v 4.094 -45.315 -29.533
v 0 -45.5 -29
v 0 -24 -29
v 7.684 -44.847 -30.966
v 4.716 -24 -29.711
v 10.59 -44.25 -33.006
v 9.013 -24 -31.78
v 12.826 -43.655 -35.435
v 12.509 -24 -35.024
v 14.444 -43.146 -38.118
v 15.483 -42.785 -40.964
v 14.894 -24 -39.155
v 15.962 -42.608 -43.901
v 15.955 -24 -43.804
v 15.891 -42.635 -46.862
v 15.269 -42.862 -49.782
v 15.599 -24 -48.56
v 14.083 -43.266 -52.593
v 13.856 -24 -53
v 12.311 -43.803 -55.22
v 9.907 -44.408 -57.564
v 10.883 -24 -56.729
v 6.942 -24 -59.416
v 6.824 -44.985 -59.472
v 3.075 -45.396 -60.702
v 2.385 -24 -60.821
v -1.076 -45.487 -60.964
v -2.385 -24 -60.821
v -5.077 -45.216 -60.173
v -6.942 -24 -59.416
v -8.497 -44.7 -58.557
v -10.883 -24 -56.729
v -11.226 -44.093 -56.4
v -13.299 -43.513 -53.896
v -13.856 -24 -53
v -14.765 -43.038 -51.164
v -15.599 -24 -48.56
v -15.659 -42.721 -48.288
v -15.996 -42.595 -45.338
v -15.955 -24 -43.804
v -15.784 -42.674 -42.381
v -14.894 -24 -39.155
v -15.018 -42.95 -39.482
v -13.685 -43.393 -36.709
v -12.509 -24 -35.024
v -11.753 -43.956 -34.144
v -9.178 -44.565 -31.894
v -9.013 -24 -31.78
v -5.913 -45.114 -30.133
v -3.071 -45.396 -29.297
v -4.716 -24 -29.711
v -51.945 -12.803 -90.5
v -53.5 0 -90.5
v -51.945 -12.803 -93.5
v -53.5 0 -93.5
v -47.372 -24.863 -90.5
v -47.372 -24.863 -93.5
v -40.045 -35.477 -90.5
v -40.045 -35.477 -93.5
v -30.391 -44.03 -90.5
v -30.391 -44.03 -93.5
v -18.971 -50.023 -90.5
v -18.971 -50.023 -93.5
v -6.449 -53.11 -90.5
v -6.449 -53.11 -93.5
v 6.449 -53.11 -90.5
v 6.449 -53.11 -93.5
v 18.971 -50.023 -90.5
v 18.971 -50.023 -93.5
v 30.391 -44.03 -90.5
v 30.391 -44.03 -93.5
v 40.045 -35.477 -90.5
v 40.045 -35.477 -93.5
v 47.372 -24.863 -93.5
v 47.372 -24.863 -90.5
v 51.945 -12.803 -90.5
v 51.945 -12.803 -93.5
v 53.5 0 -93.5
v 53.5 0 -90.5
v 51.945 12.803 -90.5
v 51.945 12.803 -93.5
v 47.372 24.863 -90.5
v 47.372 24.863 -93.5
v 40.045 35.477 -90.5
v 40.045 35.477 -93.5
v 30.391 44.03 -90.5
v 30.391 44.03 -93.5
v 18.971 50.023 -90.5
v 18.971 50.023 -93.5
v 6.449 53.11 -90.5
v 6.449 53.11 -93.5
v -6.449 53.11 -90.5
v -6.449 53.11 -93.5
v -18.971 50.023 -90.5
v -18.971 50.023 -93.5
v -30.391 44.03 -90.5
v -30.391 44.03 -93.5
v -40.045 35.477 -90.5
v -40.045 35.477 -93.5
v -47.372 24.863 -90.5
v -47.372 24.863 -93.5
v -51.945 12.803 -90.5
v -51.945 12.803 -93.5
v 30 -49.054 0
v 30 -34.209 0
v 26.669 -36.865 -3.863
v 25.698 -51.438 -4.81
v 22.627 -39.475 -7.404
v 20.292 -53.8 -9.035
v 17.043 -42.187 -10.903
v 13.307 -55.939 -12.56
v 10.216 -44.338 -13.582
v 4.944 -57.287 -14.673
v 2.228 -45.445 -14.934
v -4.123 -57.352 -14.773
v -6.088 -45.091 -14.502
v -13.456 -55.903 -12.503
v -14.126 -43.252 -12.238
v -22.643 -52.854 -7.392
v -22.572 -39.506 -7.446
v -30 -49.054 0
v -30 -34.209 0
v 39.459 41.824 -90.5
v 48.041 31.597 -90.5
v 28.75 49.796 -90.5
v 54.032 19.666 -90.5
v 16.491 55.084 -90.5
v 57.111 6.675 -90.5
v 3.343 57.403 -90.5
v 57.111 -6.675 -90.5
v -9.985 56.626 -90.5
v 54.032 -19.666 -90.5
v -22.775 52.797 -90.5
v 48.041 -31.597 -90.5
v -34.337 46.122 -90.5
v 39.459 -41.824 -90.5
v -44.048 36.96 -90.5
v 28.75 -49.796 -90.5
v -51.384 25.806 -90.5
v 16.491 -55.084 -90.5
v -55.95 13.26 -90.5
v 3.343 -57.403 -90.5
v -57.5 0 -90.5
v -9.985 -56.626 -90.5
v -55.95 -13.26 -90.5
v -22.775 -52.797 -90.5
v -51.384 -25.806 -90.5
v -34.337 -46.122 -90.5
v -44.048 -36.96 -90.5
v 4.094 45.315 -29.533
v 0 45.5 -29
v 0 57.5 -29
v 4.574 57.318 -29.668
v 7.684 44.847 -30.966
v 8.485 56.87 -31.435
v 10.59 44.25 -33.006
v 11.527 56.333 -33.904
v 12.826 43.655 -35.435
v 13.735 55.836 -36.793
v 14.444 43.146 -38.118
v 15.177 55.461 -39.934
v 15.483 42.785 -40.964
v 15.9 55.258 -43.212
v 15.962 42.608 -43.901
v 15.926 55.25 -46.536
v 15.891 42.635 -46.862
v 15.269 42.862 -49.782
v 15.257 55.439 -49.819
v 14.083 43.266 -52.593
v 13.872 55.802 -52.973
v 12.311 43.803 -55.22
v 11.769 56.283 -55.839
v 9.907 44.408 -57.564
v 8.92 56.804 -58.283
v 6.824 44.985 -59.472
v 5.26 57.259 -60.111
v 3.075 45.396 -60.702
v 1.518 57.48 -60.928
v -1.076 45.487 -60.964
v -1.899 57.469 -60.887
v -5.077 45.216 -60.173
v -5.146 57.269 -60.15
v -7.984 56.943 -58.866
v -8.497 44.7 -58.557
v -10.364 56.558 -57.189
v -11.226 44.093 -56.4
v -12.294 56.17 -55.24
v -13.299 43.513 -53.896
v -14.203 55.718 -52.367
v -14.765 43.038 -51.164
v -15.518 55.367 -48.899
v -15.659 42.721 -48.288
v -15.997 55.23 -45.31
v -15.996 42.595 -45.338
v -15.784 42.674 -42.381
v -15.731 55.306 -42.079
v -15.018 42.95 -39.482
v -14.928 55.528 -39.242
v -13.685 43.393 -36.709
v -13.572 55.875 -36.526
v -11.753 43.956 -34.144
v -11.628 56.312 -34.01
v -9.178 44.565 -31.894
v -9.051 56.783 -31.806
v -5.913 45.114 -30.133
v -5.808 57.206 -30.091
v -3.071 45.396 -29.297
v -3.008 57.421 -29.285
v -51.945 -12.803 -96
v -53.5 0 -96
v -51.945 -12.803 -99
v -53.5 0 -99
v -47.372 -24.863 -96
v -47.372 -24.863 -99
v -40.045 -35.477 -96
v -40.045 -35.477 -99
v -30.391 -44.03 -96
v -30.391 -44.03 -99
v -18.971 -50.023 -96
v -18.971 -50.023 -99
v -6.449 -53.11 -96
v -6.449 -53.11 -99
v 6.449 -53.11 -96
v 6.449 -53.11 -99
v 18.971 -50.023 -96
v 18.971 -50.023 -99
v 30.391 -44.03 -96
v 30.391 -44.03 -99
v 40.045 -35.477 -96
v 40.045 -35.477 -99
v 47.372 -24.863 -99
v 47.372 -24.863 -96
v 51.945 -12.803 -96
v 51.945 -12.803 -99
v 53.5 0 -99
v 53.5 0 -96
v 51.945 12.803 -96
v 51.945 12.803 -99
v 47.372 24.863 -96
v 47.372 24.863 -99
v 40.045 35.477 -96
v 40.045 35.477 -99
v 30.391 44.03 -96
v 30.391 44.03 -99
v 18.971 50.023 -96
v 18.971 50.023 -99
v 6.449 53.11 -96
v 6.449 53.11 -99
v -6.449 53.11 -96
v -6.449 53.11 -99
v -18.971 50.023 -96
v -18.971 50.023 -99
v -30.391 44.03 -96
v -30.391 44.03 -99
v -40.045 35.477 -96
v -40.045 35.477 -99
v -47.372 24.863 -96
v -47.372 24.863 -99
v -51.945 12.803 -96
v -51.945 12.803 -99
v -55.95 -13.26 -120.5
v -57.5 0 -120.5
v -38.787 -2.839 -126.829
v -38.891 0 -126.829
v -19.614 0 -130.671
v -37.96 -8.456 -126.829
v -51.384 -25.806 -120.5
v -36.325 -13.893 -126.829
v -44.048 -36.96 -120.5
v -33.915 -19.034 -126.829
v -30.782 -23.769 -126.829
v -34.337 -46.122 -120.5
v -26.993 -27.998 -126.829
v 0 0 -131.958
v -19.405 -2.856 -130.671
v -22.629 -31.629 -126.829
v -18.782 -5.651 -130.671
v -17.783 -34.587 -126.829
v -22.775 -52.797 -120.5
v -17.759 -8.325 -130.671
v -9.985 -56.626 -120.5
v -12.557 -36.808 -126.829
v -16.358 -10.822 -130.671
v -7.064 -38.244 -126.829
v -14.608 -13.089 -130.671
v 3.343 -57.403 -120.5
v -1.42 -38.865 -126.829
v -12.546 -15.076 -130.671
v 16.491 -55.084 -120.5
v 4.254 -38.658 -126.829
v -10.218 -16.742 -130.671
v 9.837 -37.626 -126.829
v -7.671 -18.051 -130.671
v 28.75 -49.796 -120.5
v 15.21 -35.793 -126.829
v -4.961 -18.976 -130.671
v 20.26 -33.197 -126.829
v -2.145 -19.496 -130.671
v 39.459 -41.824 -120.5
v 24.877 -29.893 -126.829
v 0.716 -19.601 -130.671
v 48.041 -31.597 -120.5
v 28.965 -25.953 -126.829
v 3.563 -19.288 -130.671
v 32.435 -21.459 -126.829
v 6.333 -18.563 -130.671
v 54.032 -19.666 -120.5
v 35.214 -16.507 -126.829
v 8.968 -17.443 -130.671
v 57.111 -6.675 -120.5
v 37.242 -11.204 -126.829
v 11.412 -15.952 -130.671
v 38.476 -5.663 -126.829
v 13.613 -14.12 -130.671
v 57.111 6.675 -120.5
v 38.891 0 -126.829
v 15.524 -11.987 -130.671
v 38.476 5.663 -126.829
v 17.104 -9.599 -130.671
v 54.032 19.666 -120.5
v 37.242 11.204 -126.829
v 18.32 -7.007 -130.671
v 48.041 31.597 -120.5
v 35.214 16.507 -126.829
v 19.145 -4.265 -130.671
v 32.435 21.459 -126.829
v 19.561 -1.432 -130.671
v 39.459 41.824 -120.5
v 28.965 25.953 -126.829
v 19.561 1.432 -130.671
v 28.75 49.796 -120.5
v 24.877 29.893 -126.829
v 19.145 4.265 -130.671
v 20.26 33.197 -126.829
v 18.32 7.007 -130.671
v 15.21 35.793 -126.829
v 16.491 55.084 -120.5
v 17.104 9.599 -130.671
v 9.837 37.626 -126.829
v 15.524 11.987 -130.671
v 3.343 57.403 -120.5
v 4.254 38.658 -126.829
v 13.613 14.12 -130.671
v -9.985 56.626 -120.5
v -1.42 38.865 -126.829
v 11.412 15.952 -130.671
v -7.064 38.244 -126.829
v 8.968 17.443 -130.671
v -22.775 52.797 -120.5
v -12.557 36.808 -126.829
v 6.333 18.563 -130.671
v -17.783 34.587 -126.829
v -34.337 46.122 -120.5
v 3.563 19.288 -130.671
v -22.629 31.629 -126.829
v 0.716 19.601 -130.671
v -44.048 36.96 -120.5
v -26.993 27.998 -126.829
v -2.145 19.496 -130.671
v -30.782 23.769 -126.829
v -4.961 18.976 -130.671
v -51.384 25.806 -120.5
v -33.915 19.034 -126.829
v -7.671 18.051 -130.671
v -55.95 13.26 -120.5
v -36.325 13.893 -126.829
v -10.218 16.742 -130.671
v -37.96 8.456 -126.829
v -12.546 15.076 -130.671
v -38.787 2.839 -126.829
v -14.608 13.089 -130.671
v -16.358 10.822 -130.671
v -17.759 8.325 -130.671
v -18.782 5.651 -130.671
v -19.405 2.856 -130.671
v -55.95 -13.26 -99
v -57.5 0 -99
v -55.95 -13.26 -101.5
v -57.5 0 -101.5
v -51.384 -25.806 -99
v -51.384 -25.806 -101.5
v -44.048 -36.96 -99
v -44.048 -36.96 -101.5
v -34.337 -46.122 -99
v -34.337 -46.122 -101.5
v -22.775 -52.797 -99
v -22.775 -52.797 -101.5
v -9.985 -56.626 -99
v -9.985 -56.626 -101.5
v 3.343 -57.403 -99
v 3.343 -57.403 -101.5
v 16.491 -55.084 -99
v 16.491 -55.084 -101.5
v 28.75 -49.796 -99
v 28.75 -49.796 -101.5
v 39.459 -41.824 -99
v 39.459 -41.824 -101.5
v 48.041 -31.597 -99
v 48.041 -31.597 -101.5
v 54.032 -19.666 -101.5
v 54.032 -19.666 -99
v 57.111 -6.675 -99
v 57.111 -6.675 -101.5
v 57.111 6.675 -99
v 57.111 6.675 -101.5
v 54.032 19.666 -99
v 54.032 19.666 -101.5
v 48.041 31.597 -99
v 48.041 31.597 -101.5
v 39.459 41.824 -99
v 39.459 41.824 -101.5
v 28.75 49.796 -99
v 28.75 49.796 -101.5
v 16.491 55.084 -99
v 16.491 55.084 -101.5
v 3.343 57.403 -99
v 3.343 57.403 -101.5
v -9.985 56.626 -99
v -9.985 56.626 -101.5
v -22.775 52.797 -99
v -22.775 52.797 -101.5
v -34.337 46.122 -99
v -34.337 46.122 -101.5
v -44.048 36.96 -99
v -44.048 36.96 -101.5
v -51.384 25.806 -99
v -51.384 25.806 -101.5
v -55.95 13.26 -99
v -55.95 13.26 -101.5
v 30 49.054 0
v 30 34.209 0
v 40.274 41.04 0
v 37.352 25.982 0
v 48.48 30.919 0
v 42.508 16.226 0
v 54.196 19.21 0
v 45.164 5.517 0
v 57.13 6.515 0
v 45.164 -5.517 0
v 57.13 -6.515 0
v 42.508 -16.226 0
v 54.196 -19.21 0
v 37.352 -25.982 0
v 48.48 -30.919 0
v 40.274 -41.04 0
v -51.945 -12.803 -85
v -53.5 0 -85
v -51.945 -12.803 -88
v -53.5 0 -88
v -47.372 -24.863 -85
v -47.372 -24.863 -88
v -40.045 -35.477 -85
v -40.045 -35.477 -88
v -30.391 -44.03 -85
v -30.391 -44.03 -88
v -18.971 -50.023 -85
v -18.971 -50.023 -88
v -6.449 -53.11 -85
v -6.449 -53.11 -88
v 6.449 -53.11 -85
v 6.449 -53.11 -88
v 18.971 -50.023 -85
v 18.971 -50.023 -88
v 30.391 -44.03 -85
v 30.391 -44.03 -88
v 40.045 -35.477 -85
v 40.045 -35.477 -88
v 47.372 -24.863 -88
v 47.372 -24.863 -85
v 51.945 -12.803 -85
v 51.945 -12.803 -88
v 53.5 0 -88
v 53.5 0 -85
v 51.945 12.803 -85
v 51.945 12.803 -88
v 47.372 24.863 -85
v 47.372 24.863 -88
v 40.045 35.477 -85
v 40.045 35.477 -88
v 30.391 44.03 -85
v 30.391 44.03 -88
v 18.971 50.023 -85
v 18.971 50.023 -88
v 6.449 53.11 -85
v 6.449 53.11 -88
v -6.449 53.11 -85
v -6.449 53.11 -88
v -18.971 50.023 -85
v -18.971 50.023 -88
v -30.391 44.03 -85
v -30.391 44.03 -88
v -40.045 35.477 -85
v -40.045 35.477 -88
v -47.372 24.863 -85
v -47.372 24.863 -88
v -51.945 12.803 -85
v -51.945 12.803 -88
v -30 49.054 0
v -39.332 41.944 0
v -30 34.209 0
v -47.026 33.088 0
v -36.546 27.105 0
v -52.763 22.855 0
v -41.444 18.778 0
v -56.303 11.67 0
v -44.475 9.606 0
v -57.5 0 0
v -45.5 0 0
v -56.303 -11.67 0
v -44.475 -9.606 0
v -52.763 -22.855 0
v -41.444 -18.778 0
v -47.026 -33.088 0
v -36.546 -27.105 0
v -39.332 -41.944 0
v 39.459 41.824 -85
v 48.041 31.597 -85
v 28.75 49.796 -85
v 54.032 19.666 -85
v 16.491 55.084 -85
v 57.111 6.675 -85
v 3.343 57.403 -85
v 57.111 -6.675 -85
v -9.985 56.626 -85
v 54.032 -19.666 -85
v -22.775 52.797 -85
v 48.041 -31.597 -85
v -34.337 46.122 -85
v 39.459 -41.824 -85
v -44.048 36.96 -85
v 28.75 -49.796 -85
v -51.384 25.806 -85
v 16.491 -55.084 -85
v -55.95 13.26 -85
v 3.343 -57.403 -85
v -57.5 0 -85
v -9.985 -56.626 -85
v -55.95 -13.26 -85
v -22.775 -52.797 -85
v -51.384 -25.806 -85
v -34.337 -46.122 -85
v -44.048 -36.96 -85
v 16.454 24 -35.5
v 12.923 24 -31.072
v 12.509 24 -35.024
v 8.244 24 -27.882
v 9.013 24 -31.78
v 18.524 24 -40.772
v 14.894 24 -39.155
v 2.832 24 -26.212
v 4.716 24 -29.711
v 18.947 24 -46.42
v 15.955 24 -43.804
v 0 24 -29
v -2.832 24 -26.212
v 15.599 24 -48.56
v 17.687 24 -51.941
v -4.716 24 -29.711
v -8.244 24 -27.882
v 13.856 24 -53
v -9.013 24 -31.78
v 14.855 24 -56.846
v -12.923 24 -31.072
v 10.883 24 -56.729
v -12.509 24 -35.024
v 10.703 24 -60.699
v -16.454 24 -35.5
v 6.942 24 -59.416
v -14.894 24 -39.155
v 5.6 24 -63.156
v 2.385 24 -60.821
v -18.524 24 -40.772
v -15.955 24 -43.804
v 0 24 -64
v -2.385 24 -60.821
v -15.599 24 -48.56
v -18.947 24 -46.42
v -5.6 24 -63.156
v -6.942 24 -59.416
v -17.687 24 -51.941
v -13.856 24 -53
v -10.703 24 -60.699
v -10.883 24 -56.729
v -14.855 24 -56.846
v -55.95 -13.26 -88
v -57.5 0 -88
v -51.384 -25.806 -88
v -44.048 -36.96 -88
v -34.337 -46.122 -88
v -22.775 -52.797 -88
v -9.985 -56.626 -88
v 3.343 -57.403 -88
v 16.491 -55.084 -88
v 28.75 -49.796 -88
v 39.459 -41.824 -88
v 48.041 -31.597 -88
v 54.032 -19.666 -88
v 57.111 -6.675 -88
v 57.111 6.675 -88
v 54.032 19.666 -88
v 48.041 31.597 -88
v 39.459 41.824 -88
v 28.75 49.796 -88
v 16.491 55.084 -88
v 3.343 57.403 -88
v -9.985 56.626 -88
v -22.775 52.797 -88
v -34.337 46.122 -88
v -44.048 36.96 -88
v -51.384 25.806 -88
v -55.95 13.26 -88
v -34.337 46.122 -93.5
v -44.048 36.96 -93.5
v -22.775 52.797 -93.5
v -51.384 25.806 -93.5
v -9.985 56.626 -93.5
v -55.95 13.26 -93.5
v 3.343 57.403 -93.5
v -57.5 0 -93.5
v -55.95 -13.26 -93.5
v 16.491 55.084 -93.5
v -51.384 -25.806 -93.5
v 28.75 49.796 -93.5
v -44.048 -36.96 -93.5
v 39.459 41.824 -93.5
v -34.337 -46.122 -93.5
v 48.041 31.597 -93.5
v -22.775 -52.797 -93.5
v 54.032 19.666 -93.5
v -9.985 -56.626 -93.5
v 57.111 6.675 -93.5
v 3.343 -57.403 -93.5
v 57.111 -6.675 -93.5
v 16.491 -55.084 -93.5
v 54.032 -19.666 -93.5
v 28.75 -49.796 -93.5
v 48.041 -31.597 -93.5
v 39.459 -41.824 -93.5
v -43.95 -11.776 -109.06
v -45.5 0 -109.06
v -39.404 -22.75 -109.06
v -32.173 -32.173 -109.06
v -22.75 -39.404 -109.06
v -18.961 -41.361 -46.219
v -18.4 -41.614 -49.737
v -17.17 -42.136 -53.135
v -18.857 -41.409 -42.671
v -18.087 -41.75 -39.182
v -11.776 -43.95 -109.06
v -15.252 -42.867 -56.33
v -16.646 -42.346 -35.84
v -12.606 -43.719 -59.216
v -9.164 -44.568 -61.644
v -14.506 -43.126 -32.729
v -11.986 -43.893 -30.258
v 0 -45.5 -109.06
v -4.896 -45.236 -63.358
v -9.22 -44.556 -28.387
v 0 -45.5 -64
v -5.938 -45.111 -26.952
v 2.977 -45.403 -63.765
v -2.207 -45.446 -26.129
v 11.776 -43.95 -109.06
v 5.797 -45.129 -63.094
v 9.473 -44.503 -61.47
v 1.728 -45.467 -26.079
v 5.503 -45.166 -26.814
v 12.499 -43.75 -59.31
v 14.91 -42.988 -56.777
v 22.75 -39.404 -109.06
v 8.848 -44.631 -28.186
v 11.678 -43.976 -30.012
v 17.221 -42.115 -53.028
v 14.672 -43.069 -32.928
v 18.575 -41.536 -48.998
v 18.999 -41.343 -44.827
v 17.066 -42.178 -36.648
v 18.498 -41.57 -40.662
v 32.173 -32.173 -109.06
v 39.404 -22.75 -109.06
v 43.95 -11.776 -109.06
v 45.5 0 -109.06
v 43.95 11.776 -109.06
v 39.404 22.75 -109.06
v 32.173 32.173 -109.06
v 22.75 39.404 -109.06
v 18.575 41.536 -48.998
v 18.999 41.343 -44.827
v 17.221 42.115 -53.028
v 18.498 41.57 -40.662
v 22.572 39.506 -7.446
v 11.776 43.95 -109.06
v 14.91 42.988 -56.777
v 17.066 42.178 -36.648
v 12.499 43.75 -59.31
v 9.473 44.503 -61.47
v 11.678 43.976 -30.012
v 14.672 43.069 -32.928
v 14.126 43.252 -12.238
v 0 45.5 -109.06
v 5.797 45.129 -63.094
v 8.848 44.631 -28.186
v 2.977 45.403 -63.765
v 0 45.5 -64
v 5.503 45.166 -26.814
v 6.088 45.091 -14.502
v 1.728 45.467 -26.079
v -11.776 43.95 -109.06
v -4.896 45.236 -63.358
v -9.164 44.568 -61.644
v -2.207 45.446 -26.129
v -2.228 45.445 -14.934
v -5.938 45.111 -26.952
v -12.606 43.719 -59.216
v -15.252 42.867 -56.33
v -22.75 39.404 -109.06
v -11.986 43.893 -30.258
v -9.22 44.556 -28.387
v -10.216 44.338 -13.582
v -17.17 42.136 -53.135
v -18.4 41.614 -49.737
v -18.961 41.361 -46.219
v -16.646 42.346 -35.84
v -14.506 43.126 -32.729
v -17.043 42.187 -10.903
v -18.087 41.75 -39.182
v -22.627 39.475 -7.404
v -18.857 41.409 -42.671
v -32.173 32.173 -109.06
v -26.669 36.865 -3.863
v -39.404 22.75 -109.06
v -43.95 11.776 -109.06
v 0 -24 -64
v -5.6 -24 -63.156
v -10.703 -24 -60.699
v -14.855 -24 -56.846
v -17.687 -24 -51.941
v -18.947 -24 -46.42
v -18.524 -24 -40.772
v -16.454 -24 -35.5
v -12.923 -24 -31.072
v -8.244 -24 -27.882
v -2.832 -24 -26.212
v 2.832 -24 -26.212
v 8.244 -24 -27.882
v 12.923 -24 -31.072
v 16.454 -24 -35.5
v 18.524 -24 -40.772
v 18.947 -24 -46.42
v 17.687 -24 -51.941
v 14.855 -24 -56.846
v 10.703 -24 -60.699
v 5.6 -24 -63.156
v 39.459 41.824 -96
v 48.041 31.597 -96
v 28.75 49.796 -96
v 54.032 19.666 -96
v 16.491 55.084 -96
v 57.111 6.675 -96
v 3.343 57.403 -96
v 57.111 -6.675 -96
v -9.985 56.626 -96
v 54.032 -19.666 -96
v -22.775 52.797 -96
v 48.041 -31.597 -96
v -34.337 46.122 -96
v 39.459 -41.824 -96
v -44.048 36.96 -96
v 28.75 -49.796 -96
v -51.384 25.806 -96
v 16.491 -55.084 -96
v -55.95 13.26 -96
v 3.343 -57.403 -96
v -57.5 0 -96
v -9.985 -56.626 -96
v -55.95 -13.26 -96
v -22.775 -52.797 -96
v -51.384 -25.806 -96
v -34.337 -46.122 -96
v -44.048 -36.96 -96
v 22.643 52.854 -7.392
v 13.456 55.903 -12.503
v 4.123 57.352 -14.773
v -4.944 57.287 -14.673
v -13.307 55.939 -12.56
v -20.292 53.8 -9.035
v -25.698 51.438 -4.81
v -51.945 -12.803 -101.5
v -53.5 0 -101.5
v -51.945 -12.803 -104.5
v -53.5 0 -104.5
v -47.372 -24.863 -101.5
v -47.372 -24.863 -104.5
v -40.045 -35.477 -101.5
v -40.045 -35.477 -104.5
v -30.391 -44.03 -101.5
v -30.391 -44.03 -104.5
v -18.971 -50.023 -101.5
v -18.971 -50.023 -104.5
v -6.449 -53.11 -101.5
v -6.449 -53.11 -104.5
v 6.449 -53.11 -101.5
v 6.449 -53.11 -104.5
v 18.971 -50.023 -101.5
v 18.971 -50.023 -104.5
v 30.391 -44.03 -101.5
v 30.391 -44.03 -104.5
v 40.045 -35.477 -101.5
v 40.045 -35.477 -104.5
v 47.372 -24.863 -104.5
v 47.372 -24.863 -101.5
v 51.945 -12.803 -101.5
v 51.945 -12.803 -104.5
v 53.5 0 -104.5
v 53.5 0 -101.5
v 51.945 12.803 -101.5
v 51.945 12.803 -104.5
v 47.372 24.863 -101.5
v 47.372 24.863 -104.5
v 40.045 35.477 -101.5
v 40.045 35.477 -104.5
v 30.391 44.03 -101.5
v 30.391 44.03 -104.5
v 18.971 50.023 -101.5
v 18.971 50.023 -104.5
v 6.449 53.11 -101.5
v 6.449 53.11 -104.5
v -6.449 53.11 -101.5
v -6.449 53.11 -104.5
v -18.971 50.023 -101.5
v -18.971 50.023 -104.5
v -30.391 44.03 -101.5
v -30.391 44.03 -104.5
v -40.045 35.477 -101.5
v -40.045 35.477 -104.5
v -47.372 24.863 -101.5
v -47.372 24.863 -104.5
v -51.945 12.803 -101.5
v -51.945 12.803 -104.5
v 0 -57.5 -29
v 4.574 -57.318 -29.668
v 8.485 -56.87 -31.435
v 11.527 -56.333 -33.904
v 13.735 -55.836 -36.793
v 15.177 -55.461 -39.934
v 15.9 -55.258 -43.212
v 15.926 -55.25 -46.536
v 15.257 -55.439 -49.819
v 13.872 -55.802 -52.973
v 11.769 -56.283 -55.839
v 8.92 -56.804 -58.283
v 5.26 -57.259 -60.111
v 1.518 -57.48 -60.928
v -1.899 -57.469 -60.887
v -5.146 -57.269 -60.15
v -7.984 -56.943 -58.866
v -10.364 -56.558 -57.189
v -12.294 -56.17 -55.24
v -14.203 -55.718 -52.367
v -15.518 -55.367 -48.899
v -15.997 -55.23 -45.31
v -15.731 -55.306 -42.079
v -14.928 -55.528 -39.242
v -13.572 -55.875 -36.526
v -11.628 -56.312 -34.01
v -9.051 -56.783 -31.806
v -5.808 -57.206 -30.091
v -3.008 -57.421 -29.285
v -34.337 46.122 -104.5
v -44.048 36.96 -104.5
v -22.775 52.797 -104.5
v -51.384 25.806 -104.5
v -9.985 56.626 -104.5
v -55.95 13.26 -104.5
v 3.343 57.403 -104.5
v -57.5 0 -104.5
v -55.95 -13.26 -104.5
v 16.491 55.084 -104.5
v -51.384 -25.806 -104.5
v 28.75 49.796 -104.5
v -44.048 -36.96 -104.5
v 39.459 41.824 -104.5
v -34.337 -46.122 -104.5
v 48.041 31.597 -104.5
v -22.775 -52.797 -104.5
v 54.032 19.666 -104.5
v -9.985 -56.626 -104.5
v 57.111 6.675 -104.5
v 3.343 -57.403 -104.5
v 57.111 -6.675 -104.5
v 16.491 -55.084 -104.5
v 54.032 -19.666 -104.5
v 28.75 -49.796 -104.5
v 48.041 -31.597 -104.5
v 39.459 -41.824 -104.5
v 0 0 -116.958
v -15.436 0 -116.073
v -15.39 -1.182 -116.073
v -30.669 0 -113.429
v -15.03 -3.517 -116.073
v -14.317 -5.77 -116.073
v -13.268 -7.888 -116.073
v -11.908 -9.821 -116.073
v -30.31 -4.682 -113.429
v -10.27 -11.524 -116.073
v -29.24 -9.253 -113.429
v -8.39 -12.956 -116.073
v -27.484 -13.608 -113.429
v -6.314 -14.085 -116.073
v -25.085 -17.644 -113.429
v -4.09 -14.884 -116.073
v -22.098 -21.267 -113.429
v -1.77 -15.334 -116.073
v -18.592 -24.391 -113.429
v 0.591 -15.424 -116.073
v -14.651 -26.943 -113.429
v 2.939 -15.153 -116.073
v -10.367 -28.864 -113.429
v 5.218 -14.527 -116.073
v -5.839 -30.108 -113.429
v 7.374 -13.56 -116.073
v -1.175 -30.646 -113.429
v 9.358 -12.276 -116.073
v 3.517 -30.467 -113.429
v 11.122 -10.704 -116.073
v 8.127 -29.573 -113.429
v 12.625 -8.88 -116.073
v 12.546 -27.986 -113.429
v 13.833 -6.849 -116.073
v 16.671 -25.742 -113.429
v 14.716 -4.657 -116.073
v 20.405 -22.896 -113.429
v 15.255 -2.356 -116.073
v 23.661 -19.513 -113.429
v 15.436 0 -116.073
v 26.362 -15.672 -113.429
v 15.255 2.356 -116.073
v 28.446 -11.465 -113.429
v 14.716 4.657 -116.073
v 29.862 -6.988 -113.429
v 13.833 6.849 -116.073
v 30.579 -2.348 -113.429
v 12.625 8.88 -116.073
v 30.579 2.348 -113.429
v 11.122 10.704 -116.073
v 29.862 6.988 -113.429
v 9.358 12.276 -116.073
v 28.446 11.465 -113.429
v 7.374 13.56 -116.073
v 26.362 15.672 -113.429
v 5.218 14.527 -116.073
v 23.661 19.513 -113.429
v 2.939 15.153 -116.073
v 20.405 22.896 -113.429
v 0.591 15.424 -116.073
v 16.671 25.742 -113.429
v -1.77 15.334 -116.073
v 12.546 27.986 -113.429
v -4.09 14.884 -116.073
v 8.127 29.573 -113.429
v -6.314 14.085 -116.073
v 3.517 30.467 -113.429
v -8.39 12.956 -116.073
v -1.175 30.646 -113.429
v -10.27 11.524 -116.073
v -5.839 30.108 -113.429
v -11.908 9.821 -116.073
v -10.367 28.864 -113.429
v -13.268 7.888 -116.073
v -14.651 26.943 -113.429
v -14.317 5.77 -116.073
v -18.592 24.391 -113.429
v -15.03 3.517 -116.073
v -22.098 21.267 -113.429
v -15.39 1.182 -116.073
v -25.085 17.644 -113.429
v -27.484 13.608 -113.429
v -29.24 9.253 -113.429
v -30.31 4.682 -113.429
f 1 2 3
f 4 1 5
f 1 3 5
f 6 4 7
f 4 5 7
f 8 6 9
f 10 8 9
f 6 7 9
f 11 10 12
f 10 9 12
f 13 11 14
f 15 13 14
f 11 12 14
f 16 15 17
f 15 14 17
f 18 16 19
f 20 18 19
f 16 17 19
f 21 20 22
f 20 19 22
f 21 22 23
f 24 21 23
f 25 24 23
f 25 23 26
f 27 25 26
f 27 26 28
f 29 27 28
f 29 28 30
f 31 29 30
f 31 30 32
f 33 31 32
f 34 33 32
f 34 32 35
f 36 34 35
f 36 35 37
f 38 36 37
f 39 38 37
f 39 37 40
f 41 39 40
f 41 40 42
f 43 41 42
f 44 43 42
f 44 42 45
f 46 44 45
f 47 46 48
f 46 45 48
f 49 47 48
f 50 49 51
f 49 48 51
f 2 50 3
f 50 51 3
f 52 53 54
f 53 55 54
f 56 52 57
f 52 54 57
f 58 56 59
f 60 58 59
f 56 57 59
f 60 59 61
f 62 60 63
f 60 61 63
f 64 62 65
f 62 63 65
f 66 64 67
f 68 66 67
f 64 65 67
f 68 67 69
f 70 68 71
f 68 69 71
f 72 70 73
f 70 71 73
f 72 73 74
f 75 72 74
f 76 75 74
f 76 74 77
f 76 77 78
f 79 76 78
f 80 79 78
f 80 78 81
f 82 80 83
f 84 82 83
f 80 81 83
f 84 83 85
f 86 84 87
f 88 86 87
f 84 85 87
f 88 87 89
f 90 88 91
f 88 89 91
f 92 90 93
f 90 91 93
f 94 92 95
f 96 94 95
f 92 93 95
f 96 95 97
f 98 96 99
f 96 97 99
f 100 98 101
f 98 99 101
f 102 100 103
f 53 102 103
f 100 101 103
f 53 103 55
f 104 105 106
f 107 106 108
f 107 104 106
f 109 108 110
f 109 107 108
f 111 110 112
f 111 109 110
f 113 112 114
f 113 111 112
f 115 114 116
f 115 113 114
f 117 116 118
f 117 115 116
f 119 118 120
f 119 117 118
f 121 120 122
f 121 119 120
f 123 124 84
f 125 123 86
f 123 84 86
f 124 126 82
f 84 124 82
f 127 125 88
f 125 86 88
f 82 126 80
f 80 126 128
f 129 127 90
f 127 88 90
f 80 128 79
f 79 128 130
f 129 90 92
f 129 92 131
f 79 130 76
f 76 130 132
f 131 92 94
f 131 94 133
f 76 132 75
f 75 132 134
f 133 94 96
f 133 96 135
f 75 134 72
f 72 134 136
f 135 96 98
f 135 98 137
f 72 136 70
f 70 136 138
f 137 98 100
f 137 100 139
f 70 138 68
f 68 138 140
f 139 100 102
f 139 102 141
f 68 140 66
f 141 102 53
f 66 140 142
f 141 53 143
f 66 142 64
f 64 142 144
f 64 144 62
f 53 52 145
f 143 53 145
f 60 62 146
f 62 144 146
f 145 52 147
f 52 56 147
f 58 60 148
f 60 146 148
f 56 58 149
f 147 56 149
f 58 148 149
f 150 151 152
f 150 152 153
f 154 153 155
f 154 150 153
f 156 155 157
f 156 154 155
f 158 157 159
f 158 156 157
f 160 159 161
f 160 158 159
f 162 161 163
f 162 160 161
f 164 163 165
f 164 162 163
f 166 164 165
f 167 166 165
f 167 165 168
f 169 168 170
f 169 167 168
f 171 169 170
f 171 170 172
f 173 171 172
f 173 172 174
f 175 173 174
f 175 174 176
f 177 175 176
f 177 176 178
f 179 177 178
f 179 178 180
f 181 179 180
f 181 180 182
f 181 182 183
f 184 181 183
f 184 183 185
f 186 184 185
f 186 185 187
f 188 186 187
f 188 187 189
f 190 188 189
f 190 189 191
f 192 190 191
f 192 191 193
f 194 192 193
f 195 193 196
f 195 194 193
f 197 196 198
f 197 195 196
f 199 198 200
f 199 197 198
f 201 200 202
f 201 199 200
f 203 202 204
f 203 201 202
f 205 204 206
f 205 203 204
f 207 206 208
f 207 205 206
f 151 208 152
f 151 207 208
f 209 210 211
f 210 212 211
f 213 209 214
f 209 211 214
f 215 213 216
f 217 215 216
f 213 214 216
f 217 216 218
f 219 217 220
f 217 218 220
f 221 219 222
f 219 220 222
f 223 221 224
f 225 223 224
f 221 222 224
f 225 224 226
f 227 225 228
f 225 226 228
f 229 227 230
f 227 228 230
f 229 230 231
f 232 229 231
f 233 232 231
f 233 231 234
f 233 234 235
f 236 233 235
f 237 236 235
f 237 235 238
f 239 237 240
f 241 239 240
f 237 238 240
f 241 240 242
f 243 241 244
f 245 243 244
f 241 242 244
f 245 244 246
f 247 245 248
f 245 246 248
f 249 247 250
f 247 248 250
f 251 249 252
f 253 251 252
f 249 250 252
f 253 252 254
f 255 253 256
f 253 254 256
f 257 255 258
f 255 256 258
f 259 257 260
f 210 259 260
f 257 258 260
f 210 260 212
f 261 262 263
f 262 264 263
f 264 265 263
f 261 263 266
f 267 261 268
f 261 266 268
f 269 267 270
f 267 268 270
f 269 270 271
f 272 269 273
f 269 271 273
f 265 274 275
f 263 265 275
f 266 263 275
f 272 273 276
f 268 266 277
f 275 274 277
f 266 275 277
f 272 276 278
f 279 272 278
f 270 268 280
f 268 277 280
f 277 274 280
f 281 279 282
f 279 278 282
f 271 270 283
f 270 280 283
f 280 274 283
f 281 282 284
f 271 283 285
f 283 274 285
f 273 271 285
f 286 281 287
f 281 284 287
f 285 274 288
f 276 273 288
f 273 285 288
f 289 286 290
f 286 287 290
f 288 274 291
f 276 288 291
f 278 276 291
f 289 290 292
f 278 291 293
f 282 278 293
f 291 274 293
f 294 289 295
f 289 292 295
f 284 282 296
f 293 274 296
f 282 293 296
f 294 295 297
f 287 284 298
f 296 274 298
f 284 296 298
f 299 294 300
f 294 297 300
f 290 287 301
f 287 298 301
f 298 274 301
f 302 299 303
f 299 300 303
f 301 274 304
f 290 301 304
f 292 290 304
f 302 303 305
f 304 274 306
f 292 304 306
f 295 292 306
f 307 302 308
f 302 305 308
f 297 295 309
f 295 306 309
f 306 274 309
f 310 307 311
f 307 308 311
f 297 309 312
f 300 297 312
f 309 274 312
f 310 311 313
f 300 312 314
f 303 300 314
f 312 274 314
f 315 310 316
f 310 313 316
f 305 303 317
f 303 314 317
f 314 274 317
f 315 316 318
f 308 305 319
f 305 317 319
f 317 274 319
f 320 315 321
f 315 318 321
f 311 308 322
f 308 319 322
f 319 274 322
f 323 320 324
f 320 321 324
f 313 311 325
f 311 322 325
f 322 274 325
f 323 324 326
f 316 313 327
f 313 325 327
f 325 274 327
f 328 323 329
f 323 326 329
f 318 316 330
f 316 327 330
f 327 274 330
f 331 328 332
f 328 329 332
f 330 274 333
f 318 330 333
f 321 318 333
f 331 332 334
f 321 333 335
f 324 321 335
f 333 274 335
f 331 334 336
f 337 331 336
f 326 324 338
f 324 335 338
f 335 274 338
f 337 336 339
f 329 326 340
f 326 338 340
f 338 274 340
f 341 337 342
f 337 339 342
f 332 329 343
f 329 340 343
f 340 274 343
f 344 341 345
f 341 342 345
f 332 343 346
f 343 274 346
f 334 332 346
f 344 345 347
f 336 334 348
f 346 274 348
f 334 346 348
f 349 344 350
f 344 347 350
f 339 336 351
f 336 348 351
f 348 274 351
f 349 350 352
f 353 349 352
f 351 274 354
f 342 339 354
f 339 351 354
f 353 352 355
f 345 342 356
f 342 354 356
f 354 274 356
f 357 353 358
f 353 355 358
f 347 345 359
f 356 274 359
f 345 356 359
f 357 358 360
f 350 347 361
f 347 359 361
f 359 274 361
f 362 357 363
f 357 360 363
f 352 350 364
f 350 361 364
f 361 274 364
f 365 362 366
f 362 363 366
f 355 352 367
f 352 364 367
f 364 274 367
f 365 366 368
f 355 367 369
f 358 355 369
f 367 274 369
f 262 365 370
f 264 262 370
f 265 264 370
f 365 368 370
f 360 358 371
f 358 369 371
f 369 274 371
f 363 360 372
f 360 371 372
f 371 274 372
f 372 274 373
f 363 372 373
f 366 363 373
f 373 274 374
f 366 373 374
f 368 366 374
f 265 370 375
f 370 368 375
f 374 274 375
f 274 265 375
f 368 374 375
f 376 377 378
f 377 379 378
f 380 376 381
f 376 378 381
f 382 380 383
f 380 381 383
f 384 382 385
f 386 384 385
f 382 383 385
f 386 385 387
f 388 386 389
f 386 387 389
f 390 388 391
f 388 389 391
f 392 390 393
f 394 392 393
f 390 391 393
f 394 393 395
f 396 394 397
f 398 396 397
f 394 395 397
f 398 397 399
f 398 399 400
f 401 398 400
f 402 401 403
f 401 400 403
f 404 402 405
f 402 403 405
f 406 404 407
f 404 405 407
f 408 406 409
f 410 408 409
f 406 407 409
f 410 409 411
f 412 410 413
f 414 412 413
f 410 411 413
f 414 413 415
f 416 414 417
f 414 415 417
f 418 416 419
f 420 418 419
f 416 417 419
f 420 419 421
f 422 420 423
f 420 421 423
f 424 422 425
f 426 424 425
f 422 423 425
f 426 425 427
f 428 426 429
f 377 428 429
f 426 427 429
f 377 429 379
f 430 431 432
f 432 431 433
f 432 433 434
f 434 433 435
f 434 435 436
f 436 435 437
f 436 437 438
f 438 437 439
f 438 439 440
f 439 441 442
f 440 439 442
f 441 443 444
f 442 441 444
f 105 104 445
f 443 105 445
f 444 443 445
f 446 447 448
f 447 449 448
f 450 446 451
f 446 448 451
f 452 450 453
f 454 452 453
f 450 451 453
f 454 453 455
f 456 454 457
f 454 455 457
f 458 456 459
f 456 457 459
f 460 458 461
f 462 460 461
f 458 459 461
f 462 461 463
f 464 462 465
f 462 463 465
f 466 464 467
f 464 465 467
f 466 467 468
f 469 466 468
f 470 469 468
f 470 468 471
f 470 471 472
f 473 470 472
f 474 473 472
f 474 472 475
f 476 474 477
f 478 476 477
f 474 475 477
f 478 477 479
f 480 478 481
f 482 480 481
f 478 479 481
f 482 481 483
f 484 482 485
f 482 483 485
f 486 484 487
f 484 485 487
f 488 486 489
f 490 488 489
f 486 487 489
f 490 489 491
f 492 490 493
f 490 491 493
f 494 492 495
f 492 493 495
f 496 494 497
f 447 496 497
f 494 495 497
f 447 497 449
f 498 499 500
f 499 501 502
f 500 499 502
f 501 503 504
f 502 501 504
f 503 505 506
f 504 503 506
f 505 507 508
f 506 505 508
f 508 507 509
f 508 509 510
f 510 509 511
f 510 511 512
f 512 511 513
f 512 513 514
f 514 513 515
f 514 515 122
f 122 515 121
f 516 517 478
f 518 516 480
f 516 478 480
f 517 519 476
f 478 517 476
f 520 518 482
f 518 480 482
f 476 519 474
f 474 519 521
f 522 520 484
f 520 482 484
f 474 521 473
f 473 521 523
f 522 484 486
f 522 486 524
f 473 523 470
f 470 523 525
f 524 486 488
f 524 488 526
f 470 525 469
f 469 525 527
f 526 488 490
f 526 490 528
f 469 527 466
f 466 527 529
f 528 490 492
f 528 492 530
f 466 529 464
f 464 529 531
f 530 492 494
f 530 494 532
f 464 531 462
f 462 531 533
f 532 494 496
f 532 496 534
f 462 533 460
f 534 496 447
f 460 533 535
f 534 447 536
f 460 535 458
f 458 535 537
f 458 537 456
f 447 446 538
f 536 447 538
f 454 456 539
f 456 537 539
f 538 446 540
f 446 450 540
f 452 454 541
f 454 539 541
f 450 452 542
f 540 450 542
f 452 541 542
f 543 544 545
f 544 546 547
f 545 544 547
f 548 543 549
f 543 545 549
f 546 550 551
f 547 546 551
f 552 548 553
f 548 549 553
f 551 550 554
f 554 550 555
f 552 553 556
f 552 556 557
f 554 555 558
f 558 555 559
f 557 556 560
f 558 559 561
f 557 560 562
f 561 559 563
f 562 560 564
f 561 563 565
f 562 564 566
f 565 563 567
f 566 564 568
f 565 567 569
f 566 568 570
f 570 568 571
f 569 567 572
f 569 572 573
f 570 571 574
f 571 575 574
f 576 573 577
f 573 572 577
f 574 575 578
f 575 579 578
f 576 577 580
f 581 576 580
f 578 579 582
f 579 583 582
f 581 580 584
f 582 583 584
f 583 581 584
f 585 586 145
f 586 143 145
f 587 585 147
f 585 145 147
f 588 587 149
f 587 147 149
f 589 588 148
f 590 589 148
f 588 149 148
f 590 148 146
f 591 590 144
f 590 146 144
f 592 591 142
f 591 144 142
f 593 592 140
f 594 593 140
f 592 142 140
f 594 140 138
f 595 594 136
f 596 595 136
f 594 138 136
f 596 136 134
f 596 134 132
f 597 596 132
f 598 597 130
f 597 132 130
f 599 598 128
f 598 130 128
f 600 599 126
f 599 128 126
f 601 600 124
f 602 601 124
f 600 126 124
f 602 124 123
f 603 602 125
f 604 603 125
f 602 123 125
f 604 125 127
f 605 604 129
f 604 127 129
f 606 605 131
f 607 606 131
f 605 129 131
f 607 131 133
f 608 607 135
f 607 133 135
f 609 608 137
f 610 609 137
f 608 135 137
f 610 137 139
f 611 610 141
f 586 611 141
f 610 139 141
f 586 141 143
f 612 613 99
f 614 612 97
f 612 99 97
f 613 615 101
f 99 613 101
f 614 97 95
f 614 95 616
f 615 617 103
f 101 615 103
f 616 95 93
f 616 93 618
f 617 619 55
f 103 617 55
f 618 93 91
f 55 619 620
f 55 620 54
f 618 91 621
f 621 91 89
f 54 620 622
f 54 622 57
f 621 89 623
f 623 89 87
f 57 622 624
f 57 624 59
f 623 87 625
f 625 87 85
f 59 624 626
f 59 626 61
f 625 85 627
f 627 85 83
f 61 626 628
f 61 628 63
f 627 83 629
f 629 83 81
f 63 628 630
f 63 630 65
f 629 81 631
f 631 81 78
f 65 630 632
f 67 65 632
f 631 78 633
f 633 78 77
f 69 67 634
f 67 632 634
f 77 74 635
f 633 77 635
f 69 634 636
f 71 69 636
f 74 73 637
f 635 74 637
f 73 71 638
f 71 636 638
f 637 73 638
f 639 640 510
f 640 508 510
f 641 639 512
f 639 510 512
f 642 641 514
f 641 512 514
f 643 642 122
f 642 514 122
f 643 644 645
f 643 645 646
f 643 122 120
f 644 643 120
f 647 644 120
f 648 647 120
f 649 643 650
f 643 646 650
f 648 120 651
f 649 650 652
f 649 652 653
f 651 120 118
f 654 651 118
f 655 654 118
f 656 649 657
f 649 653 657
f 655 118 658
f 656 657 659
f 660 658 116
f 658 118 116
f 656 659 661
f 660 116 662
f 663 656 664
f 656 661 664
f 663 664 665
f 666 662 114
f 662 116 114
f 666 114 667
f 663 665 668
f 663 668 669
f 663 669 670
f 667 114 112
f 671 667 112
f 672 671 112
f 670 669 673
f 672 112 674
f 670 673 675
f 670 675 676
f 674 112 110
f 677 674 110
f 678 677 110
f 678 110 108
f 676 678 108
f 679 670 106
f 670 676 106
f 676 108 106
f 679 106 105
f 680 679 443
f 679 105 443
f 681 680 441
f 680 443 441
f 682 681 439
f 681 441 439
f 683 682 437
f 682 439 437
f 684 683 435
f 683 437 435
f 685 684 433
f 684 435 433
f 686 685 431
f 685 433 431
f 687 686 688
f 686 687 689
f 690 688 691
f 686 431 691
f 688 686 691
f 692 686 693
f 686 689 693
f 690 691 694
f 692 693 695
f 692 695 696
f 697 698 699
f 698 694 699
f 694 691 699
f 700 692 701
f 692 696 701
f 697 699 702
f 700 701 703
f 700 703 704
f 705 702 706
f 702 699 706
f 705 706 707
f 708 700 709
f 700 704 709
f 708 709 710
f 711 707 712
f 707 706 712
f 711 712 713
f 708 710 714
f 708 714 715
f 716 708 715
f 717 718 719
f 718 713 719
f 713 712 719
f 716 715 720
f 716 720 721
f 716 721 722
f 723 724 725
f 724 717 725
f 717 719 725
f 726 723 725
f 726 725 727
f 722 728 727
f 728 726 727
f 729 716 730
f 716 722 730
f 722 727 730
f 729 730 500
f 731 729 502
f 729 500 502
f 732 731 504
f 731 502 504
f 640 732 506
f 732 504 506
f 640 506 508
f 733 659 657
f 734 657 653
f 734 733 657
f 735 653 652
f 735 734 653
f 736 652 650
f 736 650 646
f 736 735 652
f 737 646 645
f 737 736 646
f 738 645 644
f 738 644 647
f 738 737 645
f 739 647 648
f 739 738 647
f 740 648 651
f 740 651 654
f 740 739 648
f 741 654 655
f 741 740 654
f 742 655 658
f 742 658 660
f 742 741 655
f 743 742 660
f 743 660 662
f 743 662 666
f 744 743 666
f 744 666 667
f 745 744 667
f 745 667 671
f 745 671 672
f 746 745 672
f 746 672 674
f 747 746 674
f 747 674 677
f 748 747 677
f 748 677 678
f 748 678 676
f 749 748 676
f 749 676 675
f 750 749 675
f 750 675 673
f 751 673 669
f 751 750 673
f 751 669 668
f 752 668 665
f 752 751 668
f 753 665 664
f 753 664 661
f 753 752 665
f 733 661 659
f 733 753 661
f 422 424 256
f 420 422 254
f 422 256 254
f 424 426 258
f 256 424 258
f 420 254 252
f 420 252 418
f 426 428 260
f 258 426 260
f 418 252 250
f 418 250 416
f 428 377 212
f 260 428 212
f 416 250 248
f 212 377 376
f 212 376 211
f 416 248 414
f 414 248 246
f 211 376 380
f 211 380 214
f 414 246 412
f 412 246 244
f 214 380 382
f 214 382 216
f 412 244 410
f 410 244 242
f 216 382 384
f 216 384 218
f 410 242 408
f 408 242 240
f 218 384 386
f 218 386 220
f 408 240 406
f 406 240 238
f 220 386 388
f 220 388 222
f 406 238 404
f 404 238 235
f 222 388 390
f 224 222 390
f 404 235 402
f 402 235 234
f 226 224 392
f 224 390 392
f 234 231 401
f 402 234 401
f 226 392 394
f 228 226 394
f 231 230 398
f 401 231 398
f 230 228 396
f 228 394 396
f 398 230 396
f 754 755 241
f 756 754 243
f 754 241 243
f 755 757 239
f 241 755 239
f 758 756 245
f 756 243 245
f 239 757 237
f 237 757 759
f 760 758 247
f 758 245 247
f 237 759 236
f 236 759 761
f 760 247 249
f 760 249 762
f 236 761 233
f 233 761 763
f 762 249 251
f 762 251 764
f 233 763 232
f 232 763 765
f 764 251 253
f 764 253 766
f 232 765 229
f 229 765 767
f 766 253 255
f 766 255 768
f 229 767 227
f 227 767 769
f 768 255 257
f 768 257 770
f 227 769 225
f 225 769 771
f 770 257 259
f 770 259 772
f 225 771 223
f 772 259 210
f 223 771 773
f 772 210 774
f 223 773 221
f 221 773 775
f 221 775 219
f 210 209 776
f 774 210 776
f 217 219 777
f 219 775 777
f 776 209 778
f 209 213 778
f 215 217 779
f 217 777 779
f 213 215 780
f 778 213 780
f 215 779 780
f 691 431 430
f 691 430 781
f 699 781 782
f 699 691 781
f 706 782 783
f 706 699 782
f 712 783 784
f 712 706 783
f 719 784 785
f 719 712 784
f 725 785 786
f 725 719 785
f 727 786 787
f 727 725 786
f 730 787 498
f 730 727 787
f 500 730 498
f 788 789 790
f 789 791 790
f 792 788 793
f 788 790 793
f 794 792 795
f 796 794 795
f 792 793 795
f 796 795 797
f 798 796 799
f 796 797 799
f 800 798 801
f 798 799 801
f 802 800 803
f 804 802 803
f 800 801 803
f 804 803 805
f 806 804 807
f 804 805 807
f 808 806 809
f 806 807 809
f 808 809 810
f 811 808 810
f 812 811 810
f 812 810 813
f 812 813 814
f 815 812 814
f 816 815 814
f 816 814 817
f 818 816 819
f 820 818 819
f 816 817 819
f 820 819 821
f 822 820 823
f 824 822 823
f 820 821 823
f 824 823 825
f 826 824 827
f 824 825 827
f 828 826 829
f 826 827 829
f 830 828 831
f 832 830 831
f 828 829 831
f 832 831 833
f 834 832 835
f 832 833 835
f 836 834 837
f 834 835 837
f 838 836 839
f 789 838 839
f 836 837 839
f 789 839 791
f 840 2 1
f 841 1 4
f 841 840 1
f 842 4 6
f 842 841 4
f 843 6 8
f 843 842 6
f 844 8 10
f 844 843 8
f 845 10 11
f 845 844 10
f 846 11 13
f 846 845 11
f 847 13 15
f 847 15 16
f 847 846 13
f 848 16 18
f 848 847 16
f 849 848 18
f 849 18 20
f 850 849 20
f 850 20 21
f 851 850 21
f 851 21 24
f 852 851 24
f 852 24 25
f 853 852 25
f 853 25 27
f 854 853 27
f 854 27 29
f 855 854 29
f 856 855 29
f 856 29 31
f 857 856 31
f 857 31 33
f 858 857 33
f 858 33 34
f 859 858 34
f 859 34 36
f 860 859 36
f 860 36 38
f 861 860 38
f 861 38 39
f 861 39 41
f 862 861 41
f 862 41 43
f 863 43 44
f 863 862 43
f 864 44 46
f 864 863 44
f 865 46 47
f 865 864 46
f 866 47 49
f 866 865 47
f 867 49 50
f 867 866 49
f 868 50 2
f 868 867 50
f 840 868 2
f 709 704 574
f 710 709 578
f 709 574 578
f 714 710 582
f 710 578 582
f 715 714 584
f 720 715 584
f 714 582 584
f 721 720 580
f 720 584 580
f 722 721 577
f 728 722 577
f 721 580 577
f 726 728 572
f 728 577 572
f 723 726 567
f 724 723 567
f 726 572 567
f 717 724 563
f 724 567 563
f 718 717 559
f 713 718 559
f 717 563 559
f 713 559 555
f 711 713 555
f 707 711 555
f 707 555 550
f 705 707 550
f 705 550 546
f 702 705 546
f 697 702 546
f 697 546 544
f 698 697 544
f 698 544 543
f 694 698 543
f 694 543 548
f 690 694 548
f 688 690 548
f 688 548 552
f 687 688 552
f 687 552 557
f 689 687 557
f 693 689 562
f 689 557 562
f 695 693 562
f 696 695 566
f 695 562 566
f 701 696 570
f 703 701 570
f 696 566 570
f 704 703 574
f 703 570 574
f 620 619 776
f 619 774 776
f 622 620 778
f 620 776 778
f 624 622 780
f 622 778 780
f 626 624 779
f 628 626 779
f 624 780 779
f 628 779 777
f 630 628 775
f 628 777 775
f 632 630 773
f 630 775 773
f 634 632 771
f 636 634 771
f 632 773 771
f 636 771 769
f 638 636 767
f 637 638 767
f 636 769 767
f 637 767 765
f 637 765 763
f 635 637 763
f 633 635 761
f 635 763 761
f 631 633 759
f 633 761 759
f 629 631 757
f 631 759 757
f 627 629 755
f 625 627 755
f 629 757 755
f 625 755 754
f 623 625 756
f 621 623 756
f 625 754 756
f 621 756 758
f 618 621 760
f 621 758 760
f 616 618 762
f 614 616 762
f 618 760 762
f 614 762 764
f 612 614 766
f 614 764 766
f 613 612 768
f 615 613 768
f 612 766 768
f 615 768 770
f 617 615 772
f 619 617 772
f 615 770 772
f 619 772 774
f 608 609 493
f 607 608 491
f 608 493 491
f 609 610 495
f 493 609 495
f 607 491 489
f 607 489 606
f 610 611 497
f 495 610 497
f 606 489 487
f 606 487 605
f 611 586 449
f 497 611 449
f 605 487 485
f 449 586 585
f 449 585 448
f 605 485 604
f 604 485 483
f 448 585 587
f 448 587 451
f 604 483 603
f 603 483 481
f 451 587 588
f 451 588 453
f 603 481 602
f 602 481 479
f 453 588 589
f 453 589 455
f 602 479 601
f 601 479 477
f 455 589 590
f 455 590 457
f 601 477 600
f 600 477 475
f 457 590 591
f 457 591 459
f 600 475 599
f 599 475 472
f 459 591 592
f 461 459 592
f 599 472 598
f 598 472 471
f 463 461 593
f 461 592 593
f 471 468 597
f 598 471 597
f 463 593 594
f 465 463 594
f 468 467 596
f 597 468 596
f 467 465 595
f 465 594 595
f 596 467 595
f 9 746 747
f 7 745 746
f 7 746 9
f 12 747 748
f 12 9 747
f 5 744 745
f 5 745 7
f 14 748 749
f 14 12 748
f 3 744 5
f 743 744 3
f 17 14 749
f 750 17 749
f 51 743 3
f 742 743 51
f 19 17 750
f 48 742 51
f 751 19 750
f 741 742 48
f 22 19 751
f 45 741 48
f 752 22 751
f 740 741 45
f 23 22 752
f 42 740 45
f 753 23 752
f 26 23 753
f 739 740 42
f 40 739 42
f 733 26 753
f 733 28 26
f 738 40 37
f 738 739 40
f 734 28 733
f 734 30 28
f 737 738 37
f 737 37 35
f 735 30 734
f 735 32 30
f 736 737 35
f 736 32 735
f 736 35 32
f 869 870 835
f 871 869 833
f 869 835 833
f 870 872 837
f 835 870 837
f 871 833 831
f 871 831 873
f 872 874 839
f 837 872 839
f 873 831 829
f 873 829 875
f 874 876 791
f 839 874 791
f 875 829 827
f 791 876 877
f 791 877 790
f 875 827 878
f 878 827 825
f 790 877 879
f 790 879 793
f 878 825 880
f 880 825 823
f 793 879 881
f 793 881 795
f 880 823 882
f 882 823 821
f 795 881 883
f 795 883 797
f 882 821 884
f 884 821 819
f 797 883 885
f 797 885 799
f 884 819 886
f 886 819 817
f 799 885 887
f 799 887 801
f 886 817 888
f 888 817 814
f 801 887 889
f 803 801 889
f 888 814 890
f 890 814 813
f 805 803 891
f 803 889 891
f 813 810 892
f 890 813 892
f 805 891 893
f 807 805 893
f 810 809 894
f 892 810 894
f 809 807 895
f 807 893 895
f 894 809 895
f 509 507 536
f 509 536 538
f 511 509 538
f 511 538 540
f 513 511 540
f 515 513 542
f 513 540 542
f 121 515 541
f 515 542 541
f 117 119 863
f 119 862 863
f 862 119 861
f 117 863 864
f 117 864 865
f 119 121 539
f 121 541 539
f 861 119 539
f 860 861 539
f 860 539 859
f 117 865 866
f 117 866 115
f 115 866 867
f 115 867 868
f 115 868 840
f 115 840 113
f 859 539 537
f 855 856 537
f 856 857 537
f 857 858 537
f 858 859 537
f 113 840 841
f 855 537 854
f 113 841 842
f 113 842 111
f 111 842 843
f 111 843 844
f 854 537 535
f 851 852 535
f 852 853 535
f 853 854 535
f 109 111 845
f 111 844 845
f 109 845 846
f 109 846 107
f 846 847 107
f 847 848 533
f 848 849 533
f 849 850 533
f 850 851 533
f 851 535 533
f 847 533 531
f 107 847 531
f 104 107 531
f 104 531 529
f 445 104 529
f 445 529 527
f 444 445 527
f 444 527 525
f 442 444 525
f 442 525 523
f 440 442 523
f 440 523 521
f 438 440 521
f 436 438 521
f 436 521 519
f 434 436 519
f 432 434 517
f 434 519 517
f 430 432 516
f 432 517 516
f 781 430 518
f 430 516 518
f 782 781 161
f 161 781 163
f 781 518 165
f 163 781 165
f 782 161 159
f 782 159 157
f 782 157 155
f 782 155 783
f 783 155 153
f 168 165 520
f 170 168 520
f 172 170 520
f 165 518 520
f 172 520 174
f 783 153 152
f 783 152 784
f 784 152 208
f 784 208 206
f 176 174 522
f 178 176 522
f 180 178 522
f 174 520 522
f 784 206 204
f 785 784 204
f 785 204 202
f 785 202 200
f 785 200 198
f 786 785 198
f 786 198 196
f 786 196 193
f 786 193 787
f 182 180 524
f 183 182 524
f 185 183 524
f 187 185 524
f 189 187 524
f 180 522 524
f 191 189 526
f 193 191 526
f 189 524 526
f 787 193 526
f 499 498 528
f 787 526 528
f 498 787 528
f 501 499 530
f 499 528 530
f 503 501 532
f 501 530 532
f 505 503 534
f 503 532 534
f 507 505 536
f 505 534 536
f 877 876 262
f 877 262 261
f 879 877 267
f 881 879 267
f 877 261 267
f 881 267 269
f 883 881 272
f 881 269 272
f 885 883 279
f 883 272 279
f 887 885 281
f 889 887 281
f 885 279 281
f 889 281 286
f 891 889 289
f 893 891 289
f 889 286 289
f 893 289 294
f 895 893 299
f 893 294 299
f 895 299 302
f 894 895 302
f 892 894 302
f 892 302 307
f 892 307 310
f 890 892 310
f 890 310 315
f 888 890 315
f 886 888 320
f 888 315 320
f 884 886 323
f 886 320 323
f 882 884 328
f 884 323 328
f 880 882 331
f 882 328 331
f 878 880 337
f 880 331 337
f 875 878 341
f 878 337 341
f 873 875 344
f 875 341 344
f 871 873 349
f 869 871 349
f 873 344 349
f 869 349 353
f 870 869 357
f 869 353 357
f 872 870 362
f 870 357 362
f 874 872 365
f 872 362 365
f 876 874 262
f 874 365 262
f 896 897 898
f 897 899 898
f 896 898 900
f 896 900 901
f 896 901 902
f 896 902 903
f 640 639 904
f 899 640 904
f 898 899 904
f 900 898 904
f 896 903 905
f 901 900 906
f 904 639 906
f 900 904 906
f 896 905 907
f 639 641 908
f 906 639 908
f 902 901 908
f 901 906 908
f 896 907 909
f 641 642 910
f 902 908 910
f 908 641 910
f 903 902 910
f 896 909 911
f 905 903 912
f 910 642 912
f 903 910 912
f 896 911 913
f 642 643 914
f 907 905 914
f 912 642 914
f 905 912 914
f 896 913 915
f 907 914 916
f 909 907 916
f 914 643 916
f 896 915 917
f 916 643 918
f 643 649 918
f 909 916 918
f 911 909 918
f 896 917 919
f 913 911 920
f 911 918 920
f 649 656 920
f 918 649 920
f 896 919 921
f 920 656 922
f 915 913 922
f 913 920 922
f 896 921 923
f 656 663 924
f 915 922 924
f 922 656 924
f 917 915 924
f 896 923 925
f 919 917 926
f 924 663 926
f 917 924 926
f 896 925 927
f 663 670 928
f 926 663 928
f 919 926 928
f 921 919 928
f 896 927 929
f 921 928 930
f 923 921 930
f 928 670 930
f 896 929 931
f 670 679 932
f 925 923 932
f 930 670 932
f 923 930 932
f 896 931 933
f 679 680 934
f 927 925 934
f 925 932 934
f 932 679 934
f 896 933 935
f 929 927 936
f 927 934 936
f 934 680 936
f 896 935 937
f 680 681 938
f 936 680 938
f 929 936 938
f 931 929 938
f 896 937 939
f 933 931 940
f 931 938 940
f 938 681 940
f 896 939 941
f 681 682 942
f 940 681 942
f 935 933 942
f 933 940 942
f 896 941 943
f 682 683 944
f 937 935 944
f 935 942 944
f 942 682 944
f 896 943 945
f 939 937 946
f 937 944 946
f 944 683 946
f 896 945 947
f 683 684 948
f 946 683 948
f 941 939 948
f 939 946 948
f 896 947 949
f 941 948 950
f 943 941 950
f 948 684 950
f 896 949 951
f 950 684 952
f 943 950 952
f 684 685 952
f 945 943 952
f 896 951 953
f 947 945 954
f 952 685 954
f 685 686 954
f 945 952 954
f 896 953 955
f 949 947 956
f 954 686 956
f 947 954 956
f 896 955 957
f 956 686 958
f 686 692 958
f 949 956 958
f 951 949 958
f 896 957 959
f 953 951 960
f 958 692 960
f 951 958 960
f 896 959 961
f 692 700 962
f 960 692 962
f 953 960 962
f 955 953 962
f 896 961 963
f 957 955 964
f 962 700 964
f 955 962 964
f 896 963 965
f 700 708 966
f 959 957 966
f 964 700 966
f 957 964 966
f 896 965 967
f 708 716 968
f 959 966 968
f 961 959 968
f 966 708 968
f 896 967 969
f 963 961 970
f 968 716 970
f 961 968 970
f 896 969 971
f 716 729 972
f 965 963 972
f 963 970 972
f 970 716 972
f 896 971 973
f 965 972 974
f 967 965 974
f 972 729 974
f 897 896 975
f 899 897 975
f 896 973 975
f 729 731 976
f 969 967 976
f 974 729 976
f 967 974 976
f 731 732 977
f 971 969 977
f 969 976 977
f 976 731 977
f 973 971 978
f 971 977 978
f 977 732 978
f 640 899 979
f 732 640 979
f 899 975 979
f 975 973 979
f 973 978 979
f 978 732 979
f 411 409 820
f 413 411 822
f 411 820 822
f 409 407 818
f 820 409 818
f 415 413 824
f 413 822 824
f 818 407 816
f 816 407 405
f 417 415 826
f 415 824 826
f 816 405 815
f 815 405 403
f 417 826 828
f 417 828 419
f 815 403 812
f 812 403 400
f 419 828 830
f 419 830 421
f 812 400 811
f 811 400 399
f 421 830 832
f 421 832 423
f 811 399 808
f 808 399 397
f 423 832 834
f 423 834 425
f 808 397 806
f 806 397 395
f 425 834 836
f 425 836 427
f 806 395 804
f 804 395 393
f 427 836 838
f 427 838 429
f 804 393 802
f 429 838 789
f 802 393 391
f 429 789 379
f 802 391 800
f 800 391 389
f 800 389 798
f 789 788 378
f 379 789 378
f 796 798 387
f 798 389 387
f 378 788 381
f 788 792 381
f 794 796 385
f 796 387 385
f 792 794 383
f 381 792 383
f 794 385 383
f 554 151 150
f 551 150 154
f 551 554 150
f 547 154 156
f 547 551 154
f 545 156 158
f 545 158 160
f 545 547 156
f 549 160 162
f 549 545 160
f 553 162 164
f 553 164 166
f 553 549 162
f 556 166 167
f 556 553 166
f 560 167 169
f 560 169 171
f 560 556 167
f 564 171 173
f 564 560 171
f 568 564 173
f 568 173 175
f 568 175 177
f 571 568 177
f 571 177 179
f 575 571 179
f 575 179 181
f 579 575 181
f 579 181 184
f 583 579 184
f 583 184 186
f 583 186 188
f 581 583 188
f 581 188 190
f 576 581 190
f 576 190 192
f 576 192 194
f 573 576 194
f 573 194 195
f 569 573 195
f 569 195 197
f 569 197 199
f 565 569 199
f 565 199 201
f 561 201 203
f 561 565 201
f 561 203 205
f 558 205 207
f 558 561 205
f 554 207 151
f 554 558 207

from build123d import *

# Parameters (mm, degrees)
CUT_EXTRUDE1_DEPTH       = 156.00175185
CUT_EXTRUDE1_DEPTH_BACK  = 156.00175185
SKETCH2_R                = 16
BOSS_EXTRUDE1_REACH      = 167.413
BOSS_EXTRUDE1_END_RADIUS = 45.5
SKETCH4_R                = 19
SKETCH4_R_2              = 16
CUT_EXTRUDE2_DEPTH       = 156.001751924
CUT_EXTRUDE2_DEPTH_BACK  = 156.001751924


with BuildPart() as part:
    # Sketch1 → Revolve1 (revolve)
    with BuildSketch(Plane(origin=(0, 0, 0), x_dir=(1, 0, 0), z_dir=(0, 1, 0)), mode=Mode.PRIVATE) as revolve1_sk:
        with BuildLine():
            Line((0, 131.958489975), (0, 116.958489975))
            ThreePointArc((0, 116.958489975), (23.090251563, 114.969167301), (45.5, 109.059827497))
            Line((45.5, 109.059827497), (45.5, 0))
            Line((45.5, 0), (57.5, 0))
            Line((57.5, 0), (57.5, 85))
            Line((57.5, 85), (53.5, 85))
            Line((53.5, 85), (53.5, 88))
            Line((53.5, 88), (57.5, 88))
            Line((57.5, 88), (57.5, 90.5))
            Line((57.5, 90.5), (53.5, 90.5))
            Line((53.5, 90.5), (53.5, 93.5))
            Line((53.5, 93.5), (57.5, 93.5))
            Line((57.5, 93.5), (57.5, 96))
            Line((57.5, 96), (53.5, 96))
            Line((53.5, 96), (53.5, 99))
            Line((53.5, 99), (57.5, 99))
            Line((57.5, 99), (57.5, 101.5))
            Line((57.5, 101.5), (53.5, 101.5))
            Line((53.5, 101.5), (53.5, 104.5))
            Line((53.5, 104.5), (57.5, 104.5))
            Line((57.5, 104.5), (57.5, 120.5))
            ThreePointArc((57.5, 120.5), (29.315298875, 129.065978744), (0, 131.958489975))
        make_face()
    revolve(revolve1_sk.sketch.rotate(Axis((0, 0, -138.64598988), (0, 0, 1)), 180), axis=Axis((0, 0, -138.64598988), (0, 0, 1)))

    # Sketch2 → Cut-Extrude1 (cut, two sides: drawn at the far end of the back side and taken through both)
    with BuildSketch(Plane(origin=(0, 0, 0), x_dir=(1, 0, 0), z_dir=(0, 1, 0)).offset(-CUT_EXTRUDE1_DEPTH_BACK)):
        with Locations(Location((0, 45, 0), (0, 0, 270))):
            Circle(SKETCH2_R)
    extrude(amount=CUT_EXTRUDE1_DEPTH + CUT_EXTRUDE1_DEPTH_BACK, mode=Mode.SUBTRACT)

    # Boss-Extrude1: up to this cylinder (the profile starts inside it)
    boss_extrude1_end = Plane(origin=(0, 0, -26.537401), z_dir=(0, 0, -1)) * Cylinder(BOSS_EXTRUDE1_END_RADIUS, 426.826, mode=Mode.PRIVATE)
    # Sketch4 → Boss-Extrude1 (add, up to the surface)
    with BuildSketch(Plane(origin=(0, 24, 0), x_dir=(1, 0, 0), z_dir=(0, 1, 0)), mode=Mode.PRIVATE) as boss_extrude1_sk1:
        with Locations(Location((0, 45, 0), (0, 0, 90))):
            Circle(SKETCH4_R)
        with Locations(Location((0, 45, 0), (0, 0, 270))):
            Circle(SKETCH4_R_2, mode=Mode.SUBTRACT)
    boss_extrude1_tool1 = extrude(boss_extrude1_sk1.sketch, amount=BOSS_EXTRUDE1_REACH, mode=Mode.PRIVATE) & boss_extrude1_end
    boss_extrude1 = boss_extrude1_tool1.solids().sort_by_distance((0, 24, -26.537401))[0]
    add(boss_extrude1)

    # Mirror1: Boss-Extrude1 across plane
    add(boss_extrude1.mirror(Plane.ZX))

    # Sketch5 → Cut-Extrude2 (cut, two sides: drawn at the far end of the back side and taken through both)
    with BuildSketch(Plane(origin=(0, 0, 0), x_dir=(1, 0, 0), z_dir=(0, 1, 0)).offset(-CUT_EXTRUDE2_DEPTH_BACK)):
        with BuildLine():
            Line((-30, 0), (30, 0))
            ThreePointArc((30, 0), (0, 15), (-30, 0))
        make_face()
    extrude(amount=CUT_EXTRUDE2_DEPTH + CUT_EXTRUDE2_DEPTH_BACK, mode=Mode.SUBTRACT)


solid = part.part
